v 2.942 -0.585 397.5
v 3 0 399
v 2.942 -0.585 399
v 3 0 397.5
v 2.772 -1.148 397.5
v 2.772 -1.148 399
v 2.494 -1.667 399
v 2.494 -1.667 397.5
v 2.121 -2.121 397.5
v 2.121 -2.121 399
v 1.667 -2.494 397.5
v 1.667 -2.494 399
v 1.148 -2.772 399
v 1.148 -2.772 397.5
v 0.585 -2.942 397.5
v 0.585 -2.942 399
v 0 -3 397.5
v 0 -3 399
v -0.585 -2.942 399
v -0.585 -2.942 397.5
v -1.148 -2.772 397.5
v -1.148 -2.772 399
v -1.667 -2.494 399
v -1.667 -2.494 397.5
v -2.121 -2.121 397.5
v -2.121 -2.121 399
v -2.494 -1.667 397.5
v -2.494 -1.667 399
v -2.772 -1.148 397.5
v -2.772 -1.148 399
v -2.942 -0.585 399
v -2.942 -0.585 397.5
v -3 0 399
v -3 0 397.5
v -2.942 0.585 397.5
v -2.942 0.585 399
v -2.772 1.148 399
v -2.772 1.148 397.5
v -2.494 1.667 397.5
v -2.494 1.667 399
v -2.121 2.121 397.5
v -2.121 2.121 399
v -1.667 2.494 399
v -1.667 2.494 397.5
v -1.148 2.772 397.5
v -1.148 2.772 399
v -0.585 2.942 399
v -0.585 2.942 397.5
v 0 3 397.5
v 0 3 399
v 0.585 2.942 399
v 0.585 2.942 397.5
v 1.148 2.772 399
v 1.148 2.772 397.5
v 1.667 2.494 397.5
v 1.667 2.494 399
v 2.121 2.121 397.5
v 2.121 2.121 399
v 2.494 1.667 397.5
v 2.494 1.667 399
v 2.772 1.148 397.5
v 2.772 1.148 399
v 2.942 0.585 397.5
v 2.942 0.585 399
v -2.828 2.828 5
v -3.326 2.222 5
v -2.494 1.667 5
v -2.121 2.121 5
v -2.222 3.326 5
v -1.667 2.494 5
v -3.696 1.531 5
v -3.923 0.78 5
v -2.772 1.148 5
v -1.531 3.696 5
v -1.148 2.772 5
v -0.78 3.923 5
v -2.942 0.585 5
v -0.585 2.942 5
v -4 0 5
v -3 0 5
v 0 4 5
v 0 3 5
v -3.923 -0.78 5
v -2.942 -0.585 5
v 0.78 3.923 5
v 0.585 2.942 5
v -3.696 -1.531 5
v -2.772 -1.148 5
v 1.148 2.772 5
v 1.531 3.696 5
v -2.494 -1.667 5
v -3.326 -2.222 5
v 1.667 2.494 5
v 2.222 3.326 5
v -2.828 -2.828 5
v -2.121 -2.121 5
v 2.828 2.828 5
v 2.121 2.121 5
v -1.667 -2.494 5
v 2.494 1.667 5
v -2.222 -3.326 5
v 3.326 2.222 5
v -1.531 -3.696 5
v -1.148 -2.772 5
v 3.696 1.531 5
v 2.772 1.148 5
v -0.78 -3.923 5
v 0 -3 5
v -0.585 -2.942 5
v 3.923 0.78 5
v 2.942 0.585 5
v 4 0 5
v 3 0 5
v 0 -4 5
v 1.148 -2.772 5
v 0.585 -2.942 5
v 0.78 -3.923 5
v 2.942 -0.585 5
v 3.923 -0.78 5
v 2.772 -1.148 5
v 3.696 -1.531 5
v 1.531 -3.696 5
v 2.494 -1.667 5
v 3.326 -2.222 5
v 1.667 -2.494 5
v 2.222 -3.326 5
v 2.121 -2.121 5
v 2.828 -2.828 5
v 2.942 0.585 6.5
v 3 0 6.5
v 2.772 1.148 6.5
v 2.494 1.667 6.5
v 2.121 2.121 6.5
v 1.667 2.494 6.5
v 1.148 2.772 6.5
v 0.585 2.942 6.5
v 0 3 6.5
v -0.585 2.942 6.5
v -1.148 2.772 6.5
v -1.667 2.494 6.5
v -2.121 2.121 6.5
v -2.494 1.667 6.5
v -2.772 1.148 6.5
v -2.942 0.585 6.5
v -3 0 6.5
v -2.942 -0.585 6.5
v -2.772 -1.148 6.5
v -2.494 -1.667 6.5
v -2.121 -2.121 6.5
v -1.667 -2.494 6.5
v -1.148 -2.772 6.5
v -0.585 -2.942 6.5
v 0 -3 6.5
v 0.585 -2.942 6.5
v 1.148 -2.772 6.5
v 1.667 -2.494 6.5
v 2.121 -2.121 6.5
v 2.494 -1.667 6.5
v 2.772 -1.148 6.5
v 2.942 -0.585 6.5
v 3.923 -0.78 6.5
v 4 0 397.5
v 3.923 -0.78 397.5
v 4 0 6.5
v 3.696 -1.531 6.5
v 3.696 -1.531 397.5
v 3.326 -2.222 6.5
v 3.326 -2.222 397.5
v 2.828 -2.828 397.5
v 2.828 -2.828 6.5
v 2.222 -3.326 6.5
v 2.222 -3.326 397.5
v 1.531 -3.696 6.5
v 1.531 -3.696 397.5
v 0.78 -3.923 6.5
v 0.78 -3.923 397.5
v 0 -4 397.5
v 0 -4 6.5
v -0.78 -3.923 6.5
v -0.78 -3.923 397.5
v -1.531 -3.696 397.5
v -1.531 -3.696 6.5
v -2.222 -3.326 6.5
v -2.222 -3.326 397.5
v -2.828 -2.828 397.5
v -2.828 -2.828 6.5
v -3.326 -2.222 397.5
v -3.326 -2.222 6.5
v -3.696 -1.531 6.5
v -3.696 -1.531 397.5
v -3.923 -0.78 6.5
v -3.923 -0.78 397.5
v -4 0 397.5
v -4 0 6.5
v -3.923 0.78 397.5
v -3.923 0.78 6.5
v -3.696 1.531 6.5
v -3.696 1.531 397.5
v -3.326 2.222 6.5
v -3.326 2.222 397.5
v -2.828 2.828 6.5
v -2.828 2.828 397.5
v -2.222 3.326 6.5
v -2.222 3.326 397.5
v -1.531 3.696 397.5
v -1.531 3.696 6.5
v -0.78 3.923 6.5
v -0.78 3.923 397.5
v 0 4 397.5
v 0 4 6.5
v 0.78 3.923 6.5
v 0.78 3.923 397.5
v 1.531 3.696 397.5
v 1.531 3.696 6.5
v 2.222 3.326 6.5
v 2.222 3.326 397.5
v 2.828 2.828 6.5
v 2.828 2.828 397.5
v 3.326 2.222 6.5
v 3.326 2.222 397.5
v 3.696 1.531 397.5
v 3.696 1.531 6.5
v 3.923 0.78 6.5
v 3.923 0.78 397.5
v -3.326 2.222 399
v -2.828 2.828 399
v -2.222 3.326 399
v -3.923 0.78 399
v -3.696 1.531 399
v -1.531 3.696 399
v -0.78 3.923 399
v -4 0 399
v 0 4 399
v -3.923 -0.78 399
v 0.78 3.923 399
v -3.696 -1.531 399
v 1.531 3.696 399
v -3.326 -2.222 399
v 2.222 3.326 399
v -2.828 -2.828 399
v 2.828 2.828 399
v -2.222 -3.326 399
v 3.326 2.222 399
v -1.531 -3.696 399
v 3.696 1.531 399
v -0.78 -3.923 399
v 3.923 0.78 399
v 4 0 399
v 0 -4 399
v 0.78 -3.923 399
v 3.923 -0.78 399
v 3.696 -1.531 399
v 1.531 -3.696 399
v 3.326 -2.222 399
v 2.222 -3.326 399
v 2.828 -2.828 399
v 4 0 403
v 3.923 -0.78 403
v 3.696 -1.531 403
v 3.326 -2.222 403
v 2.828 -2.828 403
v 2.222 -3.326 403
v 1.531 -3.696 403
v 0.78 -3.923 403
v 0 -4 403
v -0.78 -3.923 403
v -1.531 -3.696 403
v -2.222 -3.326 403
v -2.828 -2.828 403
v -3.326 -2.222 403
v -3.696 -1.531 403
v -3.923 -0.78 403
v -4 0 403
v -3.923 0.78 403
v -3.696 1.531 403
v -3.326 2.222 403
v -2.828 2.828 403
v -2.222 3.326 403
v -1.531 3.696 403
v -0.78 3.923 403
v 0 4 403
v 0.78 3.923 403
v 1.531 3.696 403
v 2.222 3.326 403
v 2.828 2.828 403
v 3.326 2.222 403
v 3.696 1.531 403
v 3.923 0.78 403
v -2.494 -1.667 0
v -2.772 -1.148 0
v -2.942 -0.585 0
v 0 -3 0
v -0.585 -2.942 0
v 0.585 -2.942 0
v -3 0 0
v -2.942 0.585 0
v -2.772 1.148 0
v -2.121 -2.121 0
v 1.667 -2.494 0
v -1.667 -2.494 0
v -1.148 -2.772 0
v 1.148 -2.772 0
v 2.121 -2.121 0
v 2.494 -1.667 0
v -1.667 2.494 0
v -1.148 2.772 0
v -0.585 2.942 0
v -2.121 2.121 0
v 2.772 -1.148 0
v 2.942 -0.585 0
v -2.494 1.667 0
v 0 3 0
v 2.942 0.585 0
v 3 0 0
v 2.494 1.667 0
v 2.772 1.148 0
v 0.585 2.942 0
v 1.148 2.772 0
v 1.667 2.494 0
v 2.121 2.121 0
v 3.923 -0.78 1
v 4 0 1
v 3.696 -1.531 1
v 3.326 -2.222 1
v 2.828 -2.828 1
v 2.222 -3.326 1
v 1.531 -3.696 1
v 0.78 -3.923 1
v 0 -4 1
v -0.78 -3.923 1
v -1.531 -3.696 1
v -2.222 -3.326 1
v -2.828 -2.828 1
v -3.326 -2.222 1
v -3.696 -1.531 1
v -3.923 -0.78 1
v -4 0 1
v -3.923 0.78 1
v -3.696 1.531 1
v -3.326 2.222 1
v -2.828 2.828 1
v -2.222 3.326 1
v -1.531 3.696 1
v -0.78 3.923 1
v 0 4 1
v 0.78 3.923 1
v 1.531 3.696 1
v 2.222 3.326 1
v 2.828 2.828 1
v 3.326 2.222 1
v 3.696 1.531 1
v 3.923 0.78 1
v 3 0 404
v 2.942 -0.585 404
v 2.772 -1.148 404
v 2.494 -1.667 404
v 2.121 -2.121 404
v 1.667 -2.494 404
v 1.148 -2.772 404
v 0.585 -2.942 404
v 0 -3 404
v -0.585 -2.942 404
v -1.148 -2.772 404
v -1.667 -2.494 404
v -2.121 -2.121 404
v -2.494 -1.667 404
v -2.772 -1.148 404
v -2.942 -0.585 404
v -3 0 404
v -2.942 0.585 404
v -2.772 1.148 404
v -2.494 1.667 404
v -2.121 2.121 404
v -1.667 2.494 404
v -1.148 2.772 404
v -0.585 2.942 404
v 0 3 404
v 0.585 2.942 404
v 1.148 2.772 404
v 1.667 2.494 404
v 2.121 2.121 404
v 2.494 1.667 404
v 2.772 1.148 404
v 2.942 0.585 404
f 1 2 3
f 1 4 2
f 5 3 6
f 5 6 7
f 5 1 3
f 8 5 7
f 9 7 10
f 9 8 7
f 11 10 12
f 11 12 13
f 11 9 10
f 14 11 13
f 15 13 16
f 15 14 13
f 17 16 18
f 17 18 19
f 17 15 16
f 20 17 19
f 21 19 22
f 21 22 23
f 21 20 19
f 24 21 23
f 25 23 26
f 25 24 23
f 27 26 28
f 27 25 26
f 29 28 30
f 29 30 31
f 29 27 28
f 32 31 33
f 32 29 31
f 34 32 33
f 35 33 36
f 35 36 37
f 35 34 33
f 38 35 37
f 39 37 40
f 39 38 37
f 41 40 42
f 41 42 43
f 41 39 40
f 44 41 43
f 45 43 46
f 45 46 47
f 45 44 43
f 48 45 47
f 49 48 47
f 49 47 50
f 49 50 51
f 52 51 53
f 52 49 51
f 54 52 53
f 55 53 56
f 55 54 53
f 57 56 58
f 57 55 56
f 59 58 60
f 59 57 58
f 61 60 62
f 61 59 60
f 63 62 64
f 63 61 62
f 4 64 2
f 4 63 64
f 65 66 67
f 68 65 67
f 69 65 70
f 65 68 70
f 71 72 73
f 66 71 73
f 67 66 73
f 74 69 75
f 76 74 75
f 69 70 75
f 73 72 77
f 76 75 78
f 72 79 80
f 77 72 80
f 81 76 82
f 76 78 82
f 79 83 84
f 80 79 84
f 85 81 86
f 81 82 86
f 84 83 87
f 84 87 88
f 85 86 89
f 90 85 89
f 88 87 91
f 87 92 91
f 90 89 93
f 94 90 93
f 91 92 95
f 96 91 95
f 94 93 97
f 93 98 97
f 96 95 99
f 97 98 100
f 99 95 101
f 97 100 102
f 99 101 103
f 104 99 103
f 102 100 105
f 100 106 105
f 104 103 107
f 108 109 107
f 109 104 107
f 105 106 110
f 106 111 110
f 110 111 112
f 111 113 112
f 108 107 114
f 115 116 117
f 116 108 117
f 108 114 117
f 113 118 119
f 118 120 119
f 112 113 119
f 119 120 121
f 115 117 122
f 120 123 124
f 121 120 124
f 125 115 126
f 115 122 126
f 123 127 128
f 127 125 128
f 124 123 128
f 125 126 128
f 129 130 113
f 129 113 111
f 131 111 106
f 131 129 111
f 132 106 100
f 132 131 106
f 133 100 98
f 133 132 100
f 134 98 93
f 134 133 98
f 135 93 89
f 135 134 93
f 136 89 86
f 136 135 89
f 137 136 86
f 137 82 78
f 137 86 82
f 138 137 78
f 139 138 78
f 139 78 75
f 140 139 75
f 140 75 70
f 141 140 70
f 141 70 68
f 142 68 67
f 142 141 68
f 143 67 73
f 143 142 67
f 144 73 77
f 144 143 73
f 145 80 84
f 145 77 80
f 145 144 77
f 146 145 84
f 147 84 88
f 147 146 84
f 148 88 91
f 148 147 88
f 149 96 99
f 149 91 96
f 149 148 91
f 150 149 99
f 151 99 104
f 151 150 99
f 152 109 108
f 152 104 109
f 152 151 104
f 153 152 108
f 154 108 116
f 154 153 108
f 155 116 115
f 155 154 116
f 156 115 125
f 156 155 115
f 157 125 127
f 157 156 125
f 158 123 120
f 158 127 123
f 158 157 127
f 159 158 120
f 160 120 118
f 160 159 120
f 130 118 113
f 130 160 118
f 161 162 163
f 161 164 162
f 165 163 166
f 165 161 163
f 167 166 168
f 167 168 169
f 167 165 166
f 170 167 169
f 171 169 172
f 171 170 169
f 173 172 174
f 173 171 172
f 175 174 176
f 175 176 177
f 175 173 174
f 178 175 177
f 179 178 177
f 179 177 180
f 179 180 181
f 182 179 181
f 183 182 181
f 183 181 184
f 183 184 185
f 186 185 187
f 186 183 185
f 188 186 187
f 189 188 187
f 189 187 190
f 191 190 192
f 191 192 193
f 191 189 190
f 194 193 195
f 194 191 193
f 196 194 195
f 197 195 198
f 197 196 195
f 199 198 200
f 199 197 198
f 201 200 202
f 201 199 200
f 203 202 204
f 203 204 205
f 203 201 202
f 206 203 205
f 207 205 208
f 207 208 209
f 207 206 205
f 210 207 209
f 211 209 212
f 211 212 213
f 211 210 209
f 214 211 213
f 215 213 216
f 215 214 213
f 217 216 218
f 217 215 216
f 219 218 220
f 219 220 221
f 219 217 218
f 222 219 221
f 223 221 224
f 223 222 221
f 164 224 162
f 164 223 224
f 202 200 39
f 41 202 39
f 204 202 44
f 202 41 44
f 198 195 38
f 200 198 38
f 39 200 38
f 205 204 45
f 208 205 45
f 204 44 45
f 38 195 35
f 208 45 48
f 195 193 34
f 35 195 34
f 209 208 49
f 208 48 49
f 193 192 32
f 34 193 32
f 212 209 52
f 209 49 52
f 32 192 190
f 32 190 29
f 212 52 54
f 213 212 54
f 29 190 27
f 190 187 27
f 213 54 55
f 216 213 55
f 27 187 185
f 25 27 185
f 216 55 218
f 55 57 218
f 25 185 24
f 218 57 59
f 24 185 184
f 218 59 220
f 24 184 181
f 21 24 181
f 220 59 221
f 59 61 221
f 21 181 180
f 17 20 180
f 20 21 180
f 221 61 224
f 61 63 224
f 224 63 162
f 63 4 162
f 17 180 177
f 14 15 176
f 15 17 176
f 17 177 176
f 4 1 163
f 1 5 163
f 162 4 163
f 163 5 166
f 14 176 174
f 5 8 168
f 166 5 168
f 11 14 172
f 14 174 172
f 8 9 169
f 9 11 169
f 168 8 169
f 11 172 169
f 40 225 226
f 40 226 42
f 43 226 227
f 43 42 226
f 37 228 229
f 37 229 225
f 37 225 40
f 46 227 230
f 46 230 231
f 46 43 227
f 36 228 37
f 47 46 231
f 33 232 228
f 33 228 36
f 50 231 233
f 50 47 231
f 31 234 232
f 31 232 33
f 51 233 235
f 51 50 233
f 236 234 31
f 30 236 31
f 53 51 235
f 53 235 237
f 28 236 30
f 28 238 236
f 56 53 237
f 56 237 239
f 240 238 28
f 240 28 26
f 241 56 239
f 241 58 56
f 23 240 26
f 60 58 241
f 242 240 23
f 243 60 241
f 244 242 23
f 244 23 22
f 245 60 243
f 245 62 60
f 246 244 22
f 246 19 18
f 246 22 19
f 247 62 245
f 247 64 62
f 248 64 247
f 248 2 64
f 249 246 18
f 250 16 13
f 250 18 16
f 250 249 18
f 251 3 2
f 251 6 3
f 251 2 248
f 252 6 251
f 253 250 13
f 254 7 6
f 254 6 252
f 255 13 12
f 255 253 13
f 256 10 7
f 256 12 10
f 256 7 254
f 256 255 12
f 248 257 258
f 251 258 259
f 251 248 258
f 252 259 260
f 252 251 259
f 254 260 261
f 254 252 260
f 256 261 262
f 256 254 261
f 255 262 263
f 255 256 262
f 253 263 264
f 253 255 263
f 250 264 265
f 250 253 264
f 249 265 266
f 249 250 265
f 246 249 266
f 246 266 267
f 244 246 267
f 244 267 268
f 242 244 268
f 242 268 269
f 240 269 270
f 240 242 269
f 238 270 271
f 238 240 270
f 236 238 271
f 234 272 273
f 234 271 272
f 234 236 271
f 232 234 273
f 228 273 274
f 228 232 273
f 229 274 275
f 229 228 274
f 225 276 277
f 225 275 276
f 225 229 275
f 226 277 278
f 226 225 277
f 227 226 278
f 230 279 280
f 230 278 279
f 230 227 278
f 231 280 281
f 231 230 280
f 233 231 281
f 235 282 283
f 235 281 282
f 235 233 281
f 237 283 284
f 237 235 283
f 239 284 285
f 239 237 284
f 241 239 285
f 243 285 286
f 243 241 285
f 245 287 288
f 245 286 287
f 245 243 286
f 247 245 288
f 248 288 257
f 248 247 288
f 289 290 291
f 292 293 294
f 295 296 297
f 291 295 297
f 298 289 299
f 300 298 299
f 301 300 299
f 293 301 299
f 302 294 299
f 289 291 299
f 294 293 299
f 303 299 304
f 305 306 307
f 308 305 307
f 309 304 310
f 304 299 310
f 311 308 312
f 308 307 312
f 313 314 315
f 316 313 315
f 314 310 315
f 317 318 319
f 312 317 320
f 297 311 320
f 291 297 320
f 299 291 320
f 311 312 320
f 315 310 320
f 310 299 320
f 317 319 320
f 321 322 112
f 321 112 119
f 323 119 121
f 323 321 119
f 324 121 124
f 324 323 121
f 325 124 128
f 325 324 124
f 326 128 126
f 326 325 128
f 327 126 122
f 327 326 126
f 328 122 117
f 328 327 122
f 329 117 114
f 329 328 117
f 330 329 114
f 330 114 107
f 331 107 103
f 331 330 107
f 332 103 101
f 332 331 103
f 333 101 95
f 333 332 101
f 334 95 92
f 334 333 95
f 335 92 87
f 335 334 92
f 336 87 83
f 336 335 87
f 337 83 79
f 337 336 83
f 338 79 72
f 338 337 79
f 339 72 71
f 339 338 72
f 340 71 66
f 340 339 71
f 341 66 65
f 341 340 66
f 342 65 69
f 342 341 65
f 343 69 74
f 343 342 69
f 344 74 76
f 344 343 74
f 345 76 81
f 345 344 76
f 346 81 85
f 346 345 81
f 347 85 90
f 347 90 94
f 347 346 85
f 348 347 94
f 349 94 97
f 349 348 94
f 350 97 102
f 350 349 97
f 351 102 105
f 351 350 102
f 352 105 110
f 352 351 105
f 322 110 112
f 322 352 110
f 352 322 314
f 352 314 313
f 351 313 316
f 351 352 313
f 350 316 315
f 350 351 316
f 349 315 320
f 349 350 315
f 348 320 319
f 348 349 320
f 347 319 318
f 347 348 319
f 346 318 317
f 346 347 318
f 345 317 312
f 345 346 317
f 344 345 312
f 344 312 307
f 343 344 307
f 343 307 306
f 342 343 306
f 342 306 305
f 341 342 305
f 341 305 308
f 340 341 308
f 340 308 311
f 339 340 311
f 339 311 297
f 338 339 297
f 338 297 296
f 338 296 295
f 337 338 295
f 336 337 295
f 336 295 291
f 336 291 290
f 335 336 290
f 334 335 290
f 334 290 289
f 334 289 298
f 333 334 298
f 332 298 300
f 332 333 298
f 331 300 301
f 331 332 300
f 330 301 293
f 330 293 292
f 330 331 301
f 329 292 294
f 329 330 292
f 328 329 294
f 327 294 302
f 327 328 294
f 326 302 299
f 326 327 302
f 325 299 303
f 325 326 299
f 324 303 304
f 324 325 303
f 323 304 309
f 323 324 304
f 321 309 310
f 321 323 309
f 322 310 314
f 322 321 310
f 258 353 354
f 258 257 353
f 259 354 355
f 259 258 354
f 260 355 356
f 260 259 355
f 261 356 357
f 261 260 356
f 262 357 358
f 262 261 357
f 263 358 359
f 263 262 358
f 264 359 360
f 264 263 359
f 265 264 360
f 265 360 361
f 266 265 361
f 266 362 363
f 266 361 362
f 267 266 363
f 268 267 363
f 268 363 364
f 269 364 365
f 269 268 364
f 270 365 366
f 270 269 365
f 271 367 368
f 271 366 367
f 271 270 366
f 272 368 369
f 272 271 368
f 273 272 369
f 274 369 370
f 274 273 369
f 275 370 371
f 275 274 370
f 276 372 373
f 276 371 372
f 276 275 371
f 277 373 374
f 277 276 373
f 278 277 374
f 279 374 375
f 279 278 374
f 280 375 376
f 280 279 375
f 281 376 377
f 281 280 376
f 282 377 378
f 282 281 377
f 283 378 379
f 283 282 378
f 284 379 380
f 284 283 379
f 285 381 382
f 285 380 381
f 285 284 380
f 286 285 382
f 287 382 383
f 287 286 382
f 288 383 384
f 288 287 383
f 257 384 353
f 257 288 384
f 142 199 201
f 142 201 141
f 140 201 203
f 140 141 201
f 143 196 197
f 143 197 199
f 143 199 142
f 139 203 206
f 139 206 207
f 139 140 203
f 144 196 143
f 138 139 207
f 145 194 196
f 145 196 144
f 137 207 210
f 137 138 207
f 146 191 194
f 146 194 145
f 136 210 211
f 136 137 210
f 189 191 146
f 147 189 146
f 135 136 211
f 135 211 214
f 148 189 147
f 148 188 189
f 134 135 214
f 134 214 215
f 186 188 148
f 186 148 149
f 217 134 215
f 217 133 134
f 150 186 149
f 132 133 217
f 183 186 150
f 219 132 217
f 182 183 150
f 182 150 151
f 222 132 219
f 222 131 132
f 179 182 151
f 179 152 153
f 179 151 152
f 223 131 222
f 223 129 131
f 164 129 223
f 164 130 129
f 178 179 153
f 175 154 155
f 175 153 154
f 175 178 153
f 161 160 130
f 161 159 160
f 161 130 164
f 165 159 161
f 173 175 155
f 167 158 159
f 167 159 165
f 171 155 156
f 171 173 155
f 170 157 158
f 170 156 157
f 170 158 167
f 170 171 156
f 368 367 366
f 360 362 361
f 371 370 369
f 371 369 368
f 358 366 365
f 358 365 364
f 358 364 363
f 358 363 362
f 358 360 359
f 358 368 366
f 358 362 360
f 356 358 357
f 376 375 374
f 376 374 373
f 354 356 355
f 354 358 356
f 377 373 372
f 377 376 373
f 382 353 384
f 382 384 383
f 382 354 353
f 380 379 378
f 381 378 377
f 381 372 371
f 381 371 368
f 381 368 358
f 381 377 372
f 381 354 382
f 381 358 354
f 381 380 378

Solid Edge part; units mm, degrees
sketch "Sketch1" plane through (0, 0, 0) normal (0, 0, 1) x (1, 0, 0)
  circle A0 centre (0, 0) radius 4
  dimension "D1" = 8
extrude "Ajout_matière_1" add sketch "Sketch1" along normal blind 404
chamfer "Chanfrein_1" distance 1 angle 45 2 edges at (-4, 0, 404) (-4, 0, 0)
sketch "Sketch2" plane through (0, 0, 0) normal (0, -1, 0) x (1, 0, 0)
  line L0 (3, 5) -> (3, 6.5)
  line L1 (3, 6.5) -> (4, 6.5)
  line L2 (4, 6.5) -> (5.3414, 6.5)
  line L3 (5.3414, 6.5) -> (5.3414, 5)
  line L4 (3, 5) -> (5.3414, 5)
  line L5 (3, 397.5) -> (6.5, 397.5)
  line L6 (6.5, 397.5) -> (6.5, 399)
  line L7 (6.5, 399) -> (3, 399)
  line L8 (3, 399) -> (3, 397.5)
  dimension "D1" = 1.5
  dimension "D2" = 1
  dimension "D3" = 5
  dimension "D4" = 1
  dimension "D5" = 1.5
  dimension "D6" = 5
revolve "RevolvedCutout1" cut sketch "Sketch2" angle 360 about axis through (0, 0, 54) along (0, 0, -1)
properties material "Acier S235"
